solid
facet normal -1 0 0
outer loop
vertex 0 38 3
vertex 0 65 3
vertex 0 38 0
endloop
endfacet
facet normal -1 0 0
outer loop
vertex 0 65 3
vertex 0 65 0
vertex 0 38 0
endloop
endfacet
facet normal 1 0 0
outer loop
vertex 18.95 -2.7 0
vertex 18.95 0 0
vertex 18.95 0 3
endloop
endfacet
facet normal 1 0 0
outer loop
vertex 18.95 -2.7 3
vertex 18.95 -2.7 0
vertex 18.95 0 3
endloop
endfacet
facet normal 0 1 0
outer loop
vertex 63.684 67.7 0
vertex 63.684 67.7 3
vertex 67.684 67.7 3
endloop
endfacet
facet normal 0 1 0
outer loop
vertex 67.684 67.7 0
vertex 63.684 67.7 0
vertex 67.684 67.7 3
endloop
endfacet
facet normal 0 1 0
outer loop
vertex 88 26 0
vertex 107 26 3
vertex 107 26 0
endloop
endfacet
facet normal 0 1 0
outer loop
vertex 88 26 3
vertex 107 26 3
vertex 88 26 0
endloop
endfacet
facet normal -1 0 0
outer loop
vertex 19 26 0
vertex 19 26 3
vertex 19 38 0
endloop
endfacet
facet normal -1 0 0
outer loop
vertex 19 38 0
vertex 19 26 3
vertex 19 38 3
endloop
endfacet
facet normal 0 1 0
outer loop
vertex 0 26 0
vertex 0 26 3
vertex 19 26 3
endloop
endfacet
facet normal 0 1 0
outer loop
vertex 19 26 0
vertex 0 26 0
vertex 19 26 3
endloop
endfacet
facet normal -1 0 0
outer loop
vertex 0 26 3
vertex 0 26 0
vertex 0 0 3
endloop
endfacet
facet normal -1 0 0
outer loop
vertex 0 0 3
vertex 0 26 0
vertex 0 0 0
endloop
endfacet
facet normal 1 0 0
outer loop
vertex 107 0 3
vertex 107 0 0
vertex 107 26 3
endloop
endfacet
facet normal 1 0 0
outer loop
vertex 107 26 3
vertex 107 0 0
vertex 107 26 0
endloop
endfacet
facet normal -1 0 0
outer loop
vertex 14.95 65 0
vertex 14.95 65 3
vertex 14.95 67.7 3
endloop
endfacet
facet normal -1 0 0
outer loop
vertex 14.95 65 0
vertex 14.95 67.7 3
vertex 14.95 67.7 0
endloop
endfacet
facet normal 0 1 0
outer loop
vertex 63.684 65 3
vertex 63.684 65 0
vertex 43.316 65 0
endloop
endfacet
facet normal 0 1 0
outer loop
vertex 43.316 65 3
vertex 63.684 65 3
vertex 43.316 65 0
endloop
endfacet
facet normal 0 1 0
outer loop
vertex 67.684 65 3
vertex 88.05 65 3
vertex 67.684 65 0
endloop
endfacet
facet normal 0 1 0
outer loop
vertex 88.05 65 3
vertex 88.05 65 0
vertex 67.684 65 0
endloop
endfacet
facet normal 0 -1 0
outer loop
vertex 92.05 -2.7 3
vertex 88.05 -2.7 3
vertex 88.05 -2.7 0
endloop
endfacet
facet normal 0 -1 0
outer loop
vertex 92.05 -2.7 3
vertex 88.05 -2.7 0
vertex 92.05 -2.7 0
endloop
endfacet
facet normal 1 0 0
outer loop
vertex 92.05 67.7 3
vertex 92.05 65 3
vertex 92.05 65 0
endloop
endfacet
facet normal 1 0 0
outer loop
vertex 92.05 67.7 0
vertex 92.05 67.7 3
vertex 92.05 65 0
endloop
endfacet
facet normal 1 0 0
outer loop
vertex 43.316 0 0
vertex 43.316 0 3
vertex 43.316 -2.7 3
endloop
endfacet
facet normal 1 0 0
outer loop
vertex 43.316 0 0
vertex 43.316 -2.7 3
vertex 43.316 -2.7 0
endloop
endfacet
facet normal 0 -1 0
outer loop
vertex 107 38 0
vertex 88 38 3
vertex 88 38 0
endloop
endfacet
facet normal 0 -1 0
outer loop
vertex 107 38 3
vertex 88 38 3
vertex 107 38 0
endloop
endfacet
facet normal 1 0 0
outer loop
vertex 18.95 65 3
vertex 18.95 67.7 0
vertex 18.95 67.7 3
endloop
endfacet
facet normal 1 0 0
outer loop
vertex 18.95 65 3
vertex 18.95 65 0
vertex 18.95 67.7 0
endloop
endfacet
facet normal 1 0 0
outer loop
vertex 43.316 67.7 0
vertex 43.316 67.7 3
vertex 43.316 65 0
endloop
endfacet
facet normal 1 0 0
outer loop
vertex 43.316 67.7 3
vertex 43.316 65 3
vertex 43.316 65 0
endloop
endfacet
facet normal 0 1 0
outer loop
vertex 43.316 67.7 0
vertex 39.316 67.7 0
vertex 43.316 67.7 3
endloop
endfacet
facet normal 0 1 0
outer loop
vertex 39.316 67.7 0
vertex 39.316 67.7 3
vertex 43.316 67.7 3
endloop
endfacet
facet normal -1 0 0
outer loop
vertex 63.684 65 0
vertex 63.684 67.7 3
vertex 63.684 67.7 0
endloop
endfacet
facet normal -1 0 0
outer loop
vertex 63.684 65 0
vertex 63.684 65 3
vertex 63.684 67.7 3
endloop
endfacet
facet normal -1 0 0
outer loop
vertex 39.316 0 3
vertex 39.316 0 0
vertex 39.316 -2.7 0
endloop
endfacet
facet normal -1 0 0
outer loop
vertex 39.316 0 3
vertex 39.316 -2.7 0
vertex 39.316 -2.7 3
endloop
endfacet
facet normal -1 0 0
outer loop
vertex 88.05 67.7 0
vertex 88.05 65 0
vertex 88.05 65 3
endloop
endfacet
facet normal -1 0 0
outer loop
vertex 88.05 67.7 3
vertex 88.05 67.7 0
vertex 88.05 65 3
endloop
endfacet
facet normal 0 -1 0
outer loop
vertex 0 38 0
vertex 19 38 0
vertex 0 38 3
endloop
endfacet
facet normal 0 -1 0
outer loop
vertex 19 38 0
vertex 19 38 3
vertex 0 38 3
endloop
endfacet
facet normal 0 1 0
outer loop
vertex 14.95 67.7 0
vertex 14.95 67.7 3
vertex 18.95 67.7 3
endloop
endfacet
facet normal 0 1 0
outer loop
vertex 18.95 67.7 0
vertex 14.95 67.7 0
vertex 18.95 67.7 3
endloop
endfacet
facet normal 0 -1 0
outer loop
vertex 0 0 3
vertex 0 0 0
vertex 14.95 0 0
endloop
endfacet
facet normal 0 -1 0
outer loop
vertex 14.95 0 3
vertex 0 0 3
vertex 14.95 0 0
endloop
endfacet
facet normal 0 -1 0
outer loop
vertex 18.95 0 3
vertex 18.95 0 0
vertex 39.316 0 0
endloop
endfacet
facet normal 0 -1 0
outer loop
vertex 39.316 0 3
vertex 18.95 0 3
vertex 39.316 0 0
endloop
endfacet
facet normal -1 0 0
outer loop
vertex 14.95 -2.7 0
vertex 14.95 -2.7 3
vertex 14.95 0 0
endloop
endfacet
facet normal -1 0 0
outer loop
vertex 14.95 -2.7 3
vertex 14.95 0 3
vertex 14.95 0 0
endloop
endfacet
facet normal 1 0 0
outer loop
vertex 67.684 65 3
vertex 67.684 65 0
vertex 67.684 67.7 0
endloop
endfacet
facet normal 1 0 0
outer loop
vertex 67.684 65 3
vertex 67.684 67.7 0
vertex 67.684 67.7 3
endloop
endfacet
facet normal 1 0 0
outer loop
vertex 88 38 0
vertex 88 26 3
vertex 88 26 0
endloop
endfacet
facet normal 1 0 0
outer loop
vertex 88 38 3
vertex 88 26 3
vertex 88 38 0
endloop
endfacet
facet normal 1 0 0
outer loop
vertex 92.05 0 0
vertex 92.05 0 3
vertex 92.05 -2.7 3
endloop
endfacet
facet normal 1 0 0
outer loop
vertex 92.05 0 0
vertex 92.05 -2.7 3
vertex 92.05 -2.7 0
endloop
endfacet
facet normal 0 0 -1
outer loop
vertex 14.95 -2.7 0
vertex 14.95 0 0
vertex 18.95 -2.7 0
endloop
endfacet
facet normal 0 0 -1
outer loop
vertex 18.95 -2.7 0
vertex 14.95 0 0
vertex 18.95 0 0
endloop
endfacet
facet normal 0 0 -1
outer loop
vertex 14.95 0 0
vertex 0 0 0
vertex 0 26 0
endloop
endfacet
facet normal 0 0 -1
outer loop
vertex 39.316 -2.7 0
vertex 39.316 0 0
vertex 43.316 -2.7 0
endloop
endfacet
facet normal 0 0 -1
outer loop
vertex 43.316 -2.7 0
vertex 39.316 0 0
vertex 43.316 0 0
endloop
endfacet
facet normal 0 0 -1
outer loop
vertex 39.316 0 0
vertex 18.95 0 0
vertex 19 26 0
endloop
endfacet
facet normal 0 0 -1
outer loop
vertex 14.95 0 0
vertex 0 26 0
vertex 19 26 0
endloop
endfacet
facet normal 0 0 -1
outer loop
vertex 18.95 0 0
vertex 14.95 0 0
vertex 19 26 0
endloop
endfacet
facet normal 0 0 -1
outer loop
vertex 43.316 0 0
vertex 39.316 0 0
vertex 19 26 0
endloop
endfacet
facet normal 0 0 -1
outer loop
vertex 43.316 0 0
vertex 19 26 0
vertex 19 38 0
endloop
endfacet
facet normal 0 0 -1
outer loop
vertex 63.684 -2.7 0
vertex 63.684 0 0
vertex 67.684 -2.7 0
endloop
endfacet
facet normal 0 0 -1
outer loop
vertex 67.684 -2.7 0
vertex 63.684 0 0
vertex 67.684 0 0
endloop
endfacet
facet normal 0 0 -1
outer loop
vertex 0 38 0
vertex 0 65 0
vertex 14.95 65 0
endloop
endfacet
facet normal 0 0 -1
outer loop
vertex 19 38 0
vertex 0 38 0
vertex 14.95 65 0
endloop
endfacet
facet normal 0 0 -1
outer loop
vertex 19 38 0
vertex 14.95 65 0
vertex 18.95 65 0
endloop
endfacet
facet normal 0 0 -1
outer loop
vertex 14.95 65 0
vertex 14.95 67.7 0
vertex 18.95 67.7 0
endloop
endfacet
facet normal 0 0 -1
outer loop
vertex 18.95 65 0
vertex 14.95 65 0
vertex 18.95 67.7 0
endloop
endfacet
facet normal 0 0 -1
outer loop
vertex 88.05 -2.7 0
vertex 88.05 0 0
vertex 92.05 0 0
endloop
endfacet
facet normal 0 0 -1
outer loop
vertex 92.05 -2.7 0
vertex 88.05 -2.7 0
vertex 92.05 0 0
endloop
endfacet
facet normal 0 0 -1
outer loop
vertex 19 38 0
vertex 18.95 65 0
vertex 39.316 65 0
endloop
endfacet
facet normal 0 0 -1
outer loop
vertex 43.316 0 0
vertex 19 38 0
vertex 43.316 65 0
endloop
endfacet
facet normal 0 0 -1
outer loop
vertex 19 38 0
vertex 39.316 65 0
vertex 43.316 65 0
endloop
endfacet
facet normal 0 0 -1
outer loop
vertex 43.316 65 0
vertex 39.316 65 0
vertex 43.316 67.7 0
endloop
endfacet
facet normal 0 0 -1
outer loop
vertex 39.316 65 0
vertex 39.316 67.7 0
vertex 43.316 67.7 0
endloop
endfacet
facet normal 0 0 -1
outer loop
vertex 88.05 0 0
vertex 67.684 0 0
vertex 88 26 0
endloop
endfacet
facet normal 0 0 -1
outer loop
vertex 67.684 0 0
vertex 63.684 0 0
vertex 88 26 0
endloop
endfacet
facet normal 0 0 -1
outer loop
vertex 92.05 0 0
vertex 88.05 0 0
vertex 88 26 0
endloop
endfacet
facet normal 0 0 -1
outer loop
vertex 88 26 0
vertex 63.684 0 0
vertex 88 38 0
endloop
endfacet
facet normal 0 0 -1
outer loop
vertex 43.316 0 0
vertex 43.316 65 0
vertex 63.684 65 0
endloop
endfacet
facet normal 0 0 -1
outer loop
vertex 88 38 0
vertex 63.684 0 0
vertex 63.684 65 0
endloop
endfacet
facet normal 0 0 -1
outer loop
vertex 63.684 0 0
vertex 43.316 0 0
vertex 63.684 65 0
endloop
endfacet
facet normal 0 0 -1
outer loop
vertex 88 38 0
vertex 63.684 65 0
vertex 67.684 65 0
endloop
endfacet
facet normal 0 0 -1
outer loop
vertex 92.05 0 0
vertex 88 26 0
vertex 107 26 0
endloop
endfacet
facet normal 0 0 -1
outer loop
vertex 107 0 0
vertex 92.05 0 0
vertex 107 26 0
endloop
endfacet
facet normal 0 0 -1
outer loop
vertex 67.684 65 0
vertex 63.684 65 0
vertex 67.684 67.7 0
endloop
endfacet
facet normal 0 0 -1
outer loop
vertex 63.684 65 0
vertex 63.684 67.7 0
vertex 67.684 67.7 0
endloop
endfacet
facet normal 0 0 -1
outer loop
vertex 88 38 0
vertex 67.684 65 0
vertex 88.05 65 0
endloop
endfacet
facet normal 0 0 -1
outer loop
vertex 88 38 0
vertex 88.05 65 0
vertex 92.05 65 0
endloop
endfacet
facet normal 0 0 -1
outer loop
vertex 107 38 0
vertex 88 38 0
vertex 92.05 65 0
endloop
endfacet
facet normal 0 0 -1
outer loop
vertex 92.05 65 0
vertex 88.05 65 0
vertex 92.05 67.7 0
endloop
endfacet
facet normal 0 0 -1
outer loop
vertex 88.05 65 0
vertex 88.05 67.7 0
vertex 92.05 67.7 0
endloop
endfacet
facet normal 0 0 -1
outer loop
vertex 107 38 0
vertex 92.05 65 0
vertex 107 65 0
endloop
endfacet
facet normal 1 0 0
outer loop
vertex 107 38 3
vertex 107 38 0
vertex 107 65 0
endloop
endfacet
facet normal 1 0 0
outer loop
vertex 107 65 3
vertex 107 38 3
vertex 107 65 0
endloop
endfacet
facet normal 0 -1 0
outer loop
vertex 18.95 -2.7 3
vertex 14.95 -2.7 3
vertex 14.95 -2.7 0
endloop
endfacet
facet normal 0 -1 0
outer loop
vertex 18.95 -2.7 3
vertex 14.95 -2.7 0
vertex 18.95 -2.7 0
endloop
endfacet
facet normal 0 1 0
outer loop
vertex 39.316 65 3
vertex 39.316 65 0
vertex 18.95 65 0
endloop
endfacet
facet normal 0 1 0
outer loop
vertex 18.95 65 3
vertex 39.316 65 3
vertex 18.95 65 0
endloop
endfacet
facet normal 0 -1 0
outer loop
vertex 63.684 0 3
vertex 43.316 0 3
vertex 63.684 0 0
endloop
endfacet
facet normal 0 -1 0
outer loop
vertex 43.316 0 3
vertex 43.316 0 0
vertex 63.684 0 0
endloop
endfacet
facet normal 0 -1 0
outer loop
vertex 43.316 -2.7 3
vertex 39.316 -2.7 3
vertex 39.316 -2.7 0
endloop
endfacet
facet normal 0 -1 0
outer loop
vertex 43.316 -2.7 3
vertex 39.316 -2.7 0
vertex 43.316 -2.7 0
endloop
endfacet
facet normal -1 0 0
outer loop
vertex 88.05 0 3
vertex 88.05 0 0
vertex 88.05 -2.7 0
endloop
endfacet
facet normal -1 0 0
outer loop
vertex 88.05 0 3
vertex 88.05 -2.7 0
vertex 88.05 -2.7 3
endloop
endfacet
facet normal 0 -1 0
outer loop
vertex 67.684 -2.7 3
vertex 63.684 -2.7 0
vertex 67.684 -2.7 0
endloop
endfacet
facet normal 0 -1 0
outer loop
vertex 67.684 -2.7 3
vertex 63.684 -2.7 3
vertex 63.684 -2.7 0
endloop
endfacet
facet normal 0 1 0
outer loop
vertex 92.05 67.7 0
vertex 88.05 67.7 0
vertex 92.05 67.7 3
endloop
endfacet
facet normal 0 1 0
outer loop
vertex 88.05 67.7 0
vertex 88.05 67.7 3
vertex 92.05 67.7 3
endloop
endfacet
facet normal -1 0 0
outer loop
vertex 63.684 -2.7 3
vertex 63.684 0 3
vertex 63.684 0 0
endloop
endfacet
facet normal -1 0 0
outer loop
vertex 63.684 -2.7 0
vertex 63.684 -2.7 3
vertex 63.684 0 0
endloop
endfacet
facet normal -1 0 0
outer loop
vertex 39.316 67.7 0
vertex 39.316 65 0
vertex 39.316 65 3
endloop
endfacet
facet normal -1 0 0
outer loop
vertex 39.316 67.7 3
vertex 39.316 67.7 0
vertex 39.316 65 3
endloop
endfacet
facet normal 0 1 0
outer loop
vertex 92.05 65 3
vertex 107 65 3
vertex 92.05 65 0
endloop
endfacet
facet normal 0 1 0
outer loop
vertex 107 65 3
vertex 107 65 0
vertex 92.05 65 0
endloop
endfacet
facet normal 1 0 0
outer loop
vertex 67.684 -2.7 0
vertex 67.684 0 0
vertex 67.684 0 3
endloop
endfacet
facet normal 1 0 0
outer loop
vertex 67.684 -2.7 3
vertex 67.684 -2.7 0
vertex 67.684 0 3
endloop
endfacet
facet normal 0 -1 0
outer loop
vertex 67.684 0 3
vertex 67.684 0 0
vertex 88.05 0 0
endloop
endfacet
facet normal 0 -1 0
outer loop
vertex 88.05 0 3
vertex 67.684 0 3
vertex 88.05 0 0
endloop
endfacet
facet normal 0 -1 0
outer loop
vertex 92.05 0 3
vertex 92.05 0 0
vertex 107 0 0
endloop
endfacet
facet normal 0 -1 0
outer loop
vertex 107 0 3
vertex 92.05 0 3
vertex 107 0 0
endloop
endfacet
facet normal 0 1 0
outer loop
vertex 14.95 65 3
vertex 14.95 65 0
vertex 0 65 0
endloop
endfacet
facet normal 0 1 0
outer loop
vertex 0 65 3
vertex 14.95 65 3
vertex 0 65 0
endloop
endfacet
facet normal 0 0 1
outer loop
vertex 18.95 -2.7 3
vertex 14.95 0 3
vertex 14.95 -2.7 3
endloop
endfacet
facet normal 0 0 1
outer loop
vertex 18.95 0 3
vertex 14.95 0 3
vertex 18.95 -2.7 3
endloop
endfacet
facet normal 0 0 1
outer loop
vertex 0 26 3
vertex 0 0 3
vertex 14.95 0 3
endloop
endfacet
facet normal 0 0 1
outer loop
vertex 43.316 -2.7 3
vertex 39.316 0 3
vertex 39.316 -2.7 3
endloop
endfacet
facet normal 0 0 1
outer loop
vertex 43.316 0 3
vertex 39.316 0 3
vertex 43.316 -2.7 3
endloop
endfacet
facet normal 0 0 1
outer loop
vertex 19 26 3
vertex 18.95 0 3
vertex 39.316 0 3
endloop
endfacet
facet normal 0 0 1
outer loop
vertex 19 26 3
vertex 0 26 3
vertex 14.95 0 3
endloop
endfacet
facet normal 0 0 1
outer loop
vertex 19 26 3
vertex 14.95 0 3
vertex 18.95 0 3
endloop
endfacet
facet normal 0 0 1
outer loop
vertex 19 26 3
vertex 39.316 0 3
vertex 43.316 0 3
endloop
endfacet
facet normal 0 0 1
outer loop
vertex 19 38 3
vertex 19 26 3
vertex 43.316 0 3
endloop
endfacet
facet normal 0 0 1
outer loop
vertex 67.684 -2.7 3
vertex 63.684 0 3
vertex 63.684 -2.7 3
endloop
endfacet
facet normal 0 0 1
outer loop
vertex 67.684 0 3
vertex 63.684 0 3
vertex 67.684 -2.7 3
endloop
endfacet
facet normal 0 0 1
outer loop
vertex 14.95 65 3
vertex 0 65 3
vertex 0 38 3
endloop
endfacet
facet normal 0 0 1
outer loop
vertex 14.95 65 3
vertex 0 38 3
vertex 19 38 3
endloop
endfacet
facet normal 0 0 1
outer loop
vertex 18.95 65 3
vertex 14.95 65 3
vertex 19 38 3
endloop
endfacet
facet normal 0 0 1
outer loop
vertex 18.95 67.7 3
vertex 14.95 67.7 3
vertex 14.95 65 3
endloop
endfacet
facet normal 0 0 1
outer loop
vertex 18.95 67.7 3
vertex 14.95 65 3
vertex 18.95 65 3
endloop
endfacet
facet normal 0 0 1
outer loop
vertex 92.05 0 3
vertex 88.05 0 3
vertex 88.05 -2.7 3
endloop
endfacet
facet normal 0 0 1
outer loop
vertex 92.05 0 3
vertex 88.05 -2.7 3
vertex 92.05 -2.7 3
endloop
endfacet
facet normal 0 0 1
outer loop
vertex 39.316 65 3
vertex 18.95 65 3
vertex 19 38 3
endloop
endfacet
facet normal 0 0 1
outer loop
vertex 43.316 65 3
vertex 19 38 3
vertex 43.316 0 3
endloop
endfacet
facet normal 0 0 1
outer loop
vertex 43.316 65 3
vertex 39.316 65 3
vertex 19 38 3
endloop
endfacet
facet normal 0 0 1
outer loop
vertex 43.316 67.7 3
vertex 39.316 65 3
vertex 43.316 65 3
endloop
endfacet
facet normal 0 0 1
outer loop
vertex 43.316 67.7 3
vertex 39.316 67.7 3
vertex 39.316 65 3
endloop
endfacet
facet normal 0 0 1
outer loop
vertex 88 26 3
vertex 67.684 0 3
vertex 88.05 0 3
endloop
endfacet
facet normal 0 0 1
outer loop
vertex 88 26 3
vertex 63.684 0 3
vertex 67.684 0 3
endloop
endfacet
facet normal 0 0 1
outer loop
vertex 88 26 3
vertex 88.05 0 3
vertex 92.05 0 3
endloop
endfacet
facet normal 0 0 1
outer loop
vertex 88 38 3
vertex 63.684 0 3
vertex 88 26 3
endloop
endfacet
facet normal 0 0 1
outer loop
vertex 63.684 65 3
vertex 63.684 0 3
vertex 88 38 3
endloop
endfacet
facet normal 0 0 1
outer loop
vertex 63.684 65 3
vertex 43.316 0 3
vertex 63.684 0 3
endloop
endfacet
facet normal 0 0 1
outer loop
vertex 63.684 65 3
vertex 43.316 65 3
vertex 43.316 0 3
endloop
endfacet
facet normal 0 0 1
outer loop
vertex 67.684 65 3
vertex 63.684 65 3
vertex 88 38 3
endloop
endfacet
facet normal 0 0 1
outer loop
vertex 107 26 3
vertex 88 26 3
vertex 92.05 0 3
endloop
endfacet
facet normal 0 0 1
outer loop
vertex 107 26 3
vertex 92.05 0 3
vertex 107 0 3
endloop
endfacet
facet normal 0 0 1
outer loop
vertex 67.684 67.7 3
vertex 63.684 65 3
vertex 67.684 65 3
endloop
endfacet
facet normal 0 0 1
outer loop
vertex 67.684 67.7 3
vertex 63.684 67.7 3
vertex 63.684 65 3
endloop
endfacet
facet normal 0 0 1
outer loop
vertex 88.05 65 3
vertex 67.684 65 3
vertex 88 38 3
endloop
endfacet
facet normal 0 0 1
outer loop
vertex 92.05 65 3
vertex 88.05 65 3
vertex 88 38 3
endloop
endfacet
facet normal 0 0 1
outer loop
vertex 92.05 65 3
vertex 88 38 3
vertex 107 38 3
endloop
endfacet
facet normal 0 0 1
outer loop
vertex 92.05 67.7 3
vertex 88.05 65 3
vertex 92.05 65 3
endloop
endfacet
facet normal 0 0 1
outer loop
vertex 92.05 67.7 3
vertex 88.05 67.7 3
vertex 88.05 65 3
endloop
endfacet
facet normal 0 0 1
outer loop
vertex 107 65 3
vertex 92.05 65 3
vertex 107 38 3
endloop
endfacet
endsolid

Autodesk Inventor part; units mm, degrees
ref_plane "YZ Plane" through (0, 0, 0) normal (1, 0, 0) x (0, 1, 0)
ref_plane "XZ Plane" through (0, 0, 0) normal (0, 1, 0) x (-1, 0, 0)
ref_plane "XY Plane" through (0, 0, 0) normal (0, 0, 1) x (1, 0, 0)
sketch "Sketch1" plane through (0, 0, 0) normal (0, 0, 1) x (1, 0, 0)
  line L0 (0, 0) -> (107, 0)
  line L1 (107, 0) -> (107, 65)
  line L2 (107, 65) -> (0, 65)
  line L3 (0, 65) -> (0, 0)
  dimension "d0" = 107
  dimension "d1" = 65
extrude "Extrusion1" add sketch "Sketch1" along normal blind 3
sketch "Sketch2" plane through (0, 0, 3) normal (0, 0, 1) x (1, 0, 0)
  line L0 (0, 0) -> (107, 0) projected
  line L1 (53.5, 0) -> (53.5, 65)
  line L2 (107, 0) -> (107, 26)
  line L3 (107, 0) -> (107, 65) projected
  line L4 (107, 26) -> (88, 26)
  line L5 (88, 26) -> (88, 38)
  line L6 (88, 38) -> (107, 38)
  line L7 (0, 0) -> (0, 26)
  line L8 (0, 26) -> (19, 26)
  line L9 (19, 26) -> (19, 38)
  line L10 (19, 38) -> (0, 38)
  line L11 (0, 26) -> (0, 38)
  line L12 (0, 65) -> (0, 0) projected
  dimension "d8" = 26
  dimension "d9" = 19
  dimension "d10" = 12
  dimension "d11" = 19
extrude "Extrusion2" cut sketch "Sketch2" against normal blind 50.975
sketch "Sketch3" plane through (0, 0, 0) normal (0, -1, 0) x (1, 0, 0)
  line L0 (0, 0) -> (0, 3) projected
  line L1 (0, 1.5) -> (107, 1.5)
  line L2 (107, 0) -> (107, 3) projected
  line L3 (0, 3) -> (107, 3) projected
  line L4 (53.5, 3) -> (53.5, 0)
  line L5 (0, 0) -> (107, 0) projected
  line L6 (53.5, 1.5) -> (43.3165, 1.5)
  line L7 (53.5, 1.5) -> (63.6835, 1.5)
  line L8 (43.3165, 1.5) -> (39.3165, 1.5)
  line L9 (41.3165, 1.5) -> (39.3165, 1.5)
  line L10 (39.3165, 1.5) -> (39.3165, 3)
  line L11 (43.3165, 1.5) -> (43.3165, 0)
  line L12 (39.3165, 3) -> (43.3165, 3)
  line L13 (43.3165, 3) -> (43.3165, 0)
  line L14 (43.3165, 0) -> (39.3165, 0)
  line L15 (39.3165, 0) -> (39.3165, 3)
  line L16 (67.6835, 1.5) -> (67.6835, 3)
  line L17 (67.6835, 3) -> (63.6835, 3)
  line L18 (63.6835, 3) -> (63.6835, 0)
  line L19 (63.6835, 0) -> (67.6835, 0)
  line L20 (67.6835, 0) -> (67.6835, 3)
  line L21 (39.3165, 1.5) -> (18.9495, 1.5)
  line L22 (29.133, 1.5) -> (29.133, 3)
  line L23 (18.9495, 3) -> (14.9495, 3)
  line L24 (14.9495, 3) -> (14.9495, 0)
  line L25 (14.9495, 0) -> (18.9495, 0)
  line L26 (18.9495, 0) -> (18.9495, 3)
  line L27 (88.0505, 0) -> (88.0505, 3)
  line L28 (88.0505, 3) -> (92.0505, 3)
  line L29 (92.0505, 3) -> (92.0505, 0)
  line L30 (92.0505, 0) -> (88.0505, 0)
  point P0 (92.0505, 0)
  point P1 (63.6835, 0)
  point P2 (14.9495, 0)
  dimension "d14" = 10.1835
  dimension "d15" = 10.1835
  dimension "d16" = 4
  dimension "d17" = 2
  dimension "d18" = 1.5
  dimension "d19" = 1.5
  dimension "d20" = 20.367
extrude "Extrusion3" add sketch "Sketch3" along normal blind 2.7 contours L24 L1 L26 L5 | L24 L3 L26 L1 | L15 L1 L11 L5 | L10 L3 L13 L1 | L18 L1 L20 L5 | L18 L3 L16 L1 | L27 L1 L29 L5 | L27 L3 L29 L1
extrude "Extrusion4" add sketch "Sketch3" against normal blind 2.7 from surface at -65 contours L24 L1 L26 L5 | L24 L3 L26 L1 | L15 L1 L11 L5 | L10 L3 L13 L1 | L18 L1 L20 L5 | L18 L3 L16 L1 | L27 L1 L29 L5 | L27 L3 L29 L1
properties part number "carcasa_piezaFrontal"
